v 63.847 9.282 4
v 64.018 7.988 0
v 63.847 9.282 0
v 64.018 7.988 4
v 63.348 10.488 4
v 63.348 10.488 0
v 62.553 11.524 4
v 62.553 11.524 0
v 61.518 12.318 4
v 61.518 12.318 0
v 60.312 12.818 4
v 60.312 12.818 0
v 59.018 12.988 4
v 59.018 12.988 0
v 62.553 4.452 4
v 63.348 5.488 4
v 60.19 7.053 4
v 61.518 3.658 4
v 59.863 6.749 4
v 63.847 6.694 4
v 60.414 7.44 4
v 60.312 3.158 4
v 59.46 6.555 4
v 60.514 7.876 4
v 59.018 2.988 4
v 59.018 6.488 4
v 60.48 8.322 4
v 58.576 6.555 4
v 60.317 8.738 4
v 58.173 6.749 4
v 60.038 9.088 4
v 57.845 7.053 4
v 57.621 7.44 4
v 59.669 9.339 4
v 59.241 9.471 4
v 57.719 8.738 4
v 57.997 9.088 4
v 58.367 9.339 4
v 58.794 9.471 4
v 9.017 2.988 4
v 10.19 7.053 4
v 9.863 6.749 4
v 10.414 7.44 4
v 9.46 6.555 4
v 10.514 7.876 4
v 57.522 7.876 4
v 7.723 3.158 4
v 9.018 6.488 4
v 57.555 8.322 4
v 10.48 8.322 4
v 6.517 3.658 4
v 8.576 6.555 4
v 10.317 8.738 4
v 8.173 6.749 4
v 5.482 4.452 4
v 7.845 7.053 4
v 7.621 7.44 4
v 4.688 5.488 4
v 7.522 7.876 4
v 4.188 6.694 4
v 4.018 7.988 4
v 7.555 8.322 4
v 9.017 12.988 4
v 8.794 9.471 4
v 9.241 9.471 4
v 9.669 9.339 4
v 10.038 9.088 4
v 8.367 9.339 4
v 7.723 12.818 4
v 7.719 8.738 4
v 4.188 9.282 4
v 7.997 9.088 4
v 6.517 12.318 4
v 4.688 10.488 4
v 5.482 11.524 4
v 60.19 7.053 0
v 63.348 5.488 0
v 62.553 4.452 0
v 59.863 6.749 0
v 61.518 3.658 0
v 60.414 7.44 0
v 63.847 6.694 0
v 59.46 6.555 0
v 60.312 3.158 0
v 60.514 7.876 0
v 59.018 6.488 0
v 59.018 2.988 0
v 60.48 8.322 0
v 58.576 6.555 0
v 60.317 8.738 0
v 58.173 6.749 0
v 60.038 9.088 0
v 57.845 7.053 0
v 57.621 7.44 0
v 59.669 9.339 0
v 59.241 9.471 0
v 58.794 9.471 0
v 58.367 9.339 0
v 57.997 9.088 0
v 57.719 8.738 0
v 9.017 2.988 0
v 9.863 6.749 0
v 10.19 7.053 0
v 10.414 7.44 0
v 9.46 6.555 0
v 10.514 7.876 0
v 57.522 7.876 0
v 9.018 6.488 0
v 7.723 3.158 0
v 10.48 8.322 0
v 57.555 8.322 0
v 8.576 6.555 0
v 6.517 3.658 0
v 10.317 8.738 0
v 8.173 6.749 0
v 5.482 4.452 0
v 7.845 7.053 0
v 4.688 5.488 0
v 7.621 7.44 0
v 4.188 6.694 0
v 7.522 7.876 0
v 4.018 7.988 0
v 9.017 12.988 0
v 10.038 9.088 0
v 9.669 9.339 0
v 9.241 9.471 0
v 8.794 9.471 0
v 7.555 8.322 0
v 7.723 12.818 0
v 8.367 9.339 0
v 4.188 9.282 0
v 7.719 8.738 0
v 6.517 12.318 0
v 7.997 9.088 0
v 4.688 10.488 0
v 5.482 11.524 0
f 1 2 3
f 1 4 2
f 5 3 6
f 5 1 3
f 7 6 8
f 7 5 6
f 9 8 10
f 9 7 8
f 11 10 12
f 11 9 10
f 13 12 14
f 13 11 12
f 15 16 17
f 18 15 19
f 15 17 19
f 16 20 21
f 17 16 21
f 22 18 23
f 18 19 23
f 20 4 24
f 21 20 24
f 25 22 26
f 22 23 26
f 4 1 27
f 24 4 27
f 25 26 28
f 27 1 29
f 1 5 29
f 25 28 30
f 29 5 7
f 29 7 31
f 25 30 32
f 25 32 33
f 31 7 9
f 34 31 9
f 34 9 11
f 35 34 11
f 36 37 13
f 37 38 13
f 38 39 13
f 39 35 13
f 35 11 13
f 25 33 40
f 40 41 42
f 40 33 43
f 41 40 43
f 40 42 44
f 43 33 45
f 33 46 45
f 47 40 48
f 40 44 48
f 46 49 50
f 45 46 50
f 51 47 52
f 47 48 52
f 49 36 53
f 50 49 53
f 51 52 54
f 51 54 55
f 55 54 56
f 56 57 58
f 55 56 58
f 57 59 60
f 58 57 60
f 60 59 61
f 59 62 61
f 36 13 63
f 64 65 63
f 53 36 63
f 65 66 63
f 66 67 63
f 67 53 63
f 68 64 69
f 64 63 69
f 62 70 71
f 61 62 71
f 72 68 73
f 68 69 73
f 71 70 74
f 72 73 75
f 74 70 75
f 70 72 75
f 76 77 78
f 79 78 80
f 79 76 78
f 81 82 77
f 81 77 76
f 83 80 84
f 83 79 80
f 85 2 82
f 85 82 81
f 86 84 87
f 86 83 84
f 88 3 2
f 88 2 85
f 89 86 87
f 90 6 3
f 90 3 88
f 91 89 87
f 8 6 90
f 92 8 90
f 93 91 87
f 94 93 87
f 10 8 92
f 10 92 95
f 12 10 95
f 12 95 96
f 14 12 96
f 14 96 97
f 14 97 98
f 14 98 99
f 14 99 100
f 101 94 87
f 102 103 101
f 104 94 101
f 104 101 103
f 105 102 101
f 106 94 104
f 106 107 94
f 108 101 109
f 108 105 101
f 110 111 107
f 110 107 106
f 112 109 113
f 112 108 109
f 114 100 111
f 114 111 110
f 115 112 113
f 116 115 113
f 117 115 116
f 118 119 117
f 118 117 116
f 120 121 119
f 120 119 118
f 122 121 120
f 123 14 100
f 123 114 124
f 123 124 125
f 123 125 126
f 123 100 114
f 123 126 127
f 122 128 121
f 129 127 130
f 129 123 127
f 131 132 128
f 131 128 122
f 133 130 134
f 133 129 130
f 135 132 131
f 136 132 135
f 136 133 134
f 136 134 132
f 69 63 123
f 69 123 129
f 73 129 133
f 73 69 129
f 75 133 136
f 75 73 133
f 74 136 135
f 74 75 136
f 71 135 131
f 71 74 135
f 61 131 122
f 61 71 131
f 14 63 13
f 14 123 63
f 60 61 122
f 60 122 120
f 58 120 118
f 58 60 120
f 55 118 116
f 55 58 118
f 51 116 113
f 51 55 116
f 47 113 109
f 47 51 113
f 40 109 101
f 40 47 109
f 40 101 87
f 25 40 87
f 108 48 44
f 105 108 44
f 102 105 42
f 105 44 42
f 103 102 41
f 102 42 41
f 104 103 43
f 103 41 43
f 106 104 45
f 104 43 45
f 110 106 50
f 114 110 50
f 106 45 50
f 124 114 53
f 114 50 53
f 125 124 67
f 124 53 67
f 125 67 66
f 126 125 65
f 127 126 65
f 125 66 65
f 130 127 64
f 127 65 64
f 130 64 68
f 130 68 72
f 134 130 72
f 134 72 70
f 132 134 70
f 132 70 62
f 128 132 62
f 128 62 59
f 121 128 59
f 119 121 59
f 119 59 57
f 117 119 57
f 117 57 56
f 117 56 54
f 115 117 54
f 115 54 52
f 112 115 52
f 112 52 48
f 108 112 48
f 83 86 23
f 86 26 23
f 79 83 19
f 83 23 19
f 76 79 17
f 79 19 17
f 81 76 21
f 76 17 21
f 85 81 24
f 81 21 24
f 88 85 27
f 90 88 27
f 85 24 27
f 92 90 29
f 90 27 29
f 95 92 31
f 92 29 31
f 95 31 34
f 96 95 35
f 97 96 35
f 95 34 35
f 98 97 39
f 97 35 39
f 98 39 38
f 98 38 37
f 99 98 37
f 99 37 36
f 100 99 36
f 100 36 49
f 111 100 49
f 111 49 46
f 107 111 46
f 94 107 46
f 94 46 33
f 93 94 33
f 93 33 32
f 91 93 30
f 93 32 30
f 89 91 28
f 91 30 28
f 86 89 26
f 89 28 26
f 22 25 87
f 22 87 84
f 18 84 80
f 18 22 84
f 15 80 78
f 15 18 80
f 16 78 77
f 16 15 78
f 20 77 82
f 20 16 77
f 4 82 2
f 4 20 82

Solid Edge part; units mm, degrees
sketch "Sketch1" plane through (0, 0, 0) normal (0, 0, 1) x (1, 0, 0)
  line L0 (4.0177, 12.988) -> (9.0177, 12.988)
  line L1 (59.0177, 12.988) -> (9.0177, 12.988)
  line L2 (64.0177, 12.988) -> (59.0177, 12.988)
  line L3 (64.0177, 7.988) -> (64.0177, 12.988)
  line L4 (64.0177, 2.988) -> (64.0177, 7.988)
  line L5 (59.0177, 2.988) -> (64.0177, 2.988)
  line L6 (9.0177, 2.988) -> (59.0177, 2.988)
  line L7 (4.0177, 2.988) -> (9.0177, 2.988)
  line L8 (4.0177, 7.988) -> (4.0177, 2.988)
  line L9 (4.0177, 7.988) -> (4.0177, 12.988)
extrude "Protrusion1" add sketch "Sketch1" along normal blind 4
fillet "Redondo_3" radius 5 4 edges at (64.0177, 2.988, 2) (64.0177, 12.988, 2) (4.0177, 2.988, 2) (4.0177, 12.988, 2)
hole "Furo_3" at (9.0177, 7.988, 4) direction (0, 0, -1) diameter 3 end up to next
hole "Hole1" at (59.0177, 7.988, 4) direction (0, 0, -1) diameter 3 end up to next
